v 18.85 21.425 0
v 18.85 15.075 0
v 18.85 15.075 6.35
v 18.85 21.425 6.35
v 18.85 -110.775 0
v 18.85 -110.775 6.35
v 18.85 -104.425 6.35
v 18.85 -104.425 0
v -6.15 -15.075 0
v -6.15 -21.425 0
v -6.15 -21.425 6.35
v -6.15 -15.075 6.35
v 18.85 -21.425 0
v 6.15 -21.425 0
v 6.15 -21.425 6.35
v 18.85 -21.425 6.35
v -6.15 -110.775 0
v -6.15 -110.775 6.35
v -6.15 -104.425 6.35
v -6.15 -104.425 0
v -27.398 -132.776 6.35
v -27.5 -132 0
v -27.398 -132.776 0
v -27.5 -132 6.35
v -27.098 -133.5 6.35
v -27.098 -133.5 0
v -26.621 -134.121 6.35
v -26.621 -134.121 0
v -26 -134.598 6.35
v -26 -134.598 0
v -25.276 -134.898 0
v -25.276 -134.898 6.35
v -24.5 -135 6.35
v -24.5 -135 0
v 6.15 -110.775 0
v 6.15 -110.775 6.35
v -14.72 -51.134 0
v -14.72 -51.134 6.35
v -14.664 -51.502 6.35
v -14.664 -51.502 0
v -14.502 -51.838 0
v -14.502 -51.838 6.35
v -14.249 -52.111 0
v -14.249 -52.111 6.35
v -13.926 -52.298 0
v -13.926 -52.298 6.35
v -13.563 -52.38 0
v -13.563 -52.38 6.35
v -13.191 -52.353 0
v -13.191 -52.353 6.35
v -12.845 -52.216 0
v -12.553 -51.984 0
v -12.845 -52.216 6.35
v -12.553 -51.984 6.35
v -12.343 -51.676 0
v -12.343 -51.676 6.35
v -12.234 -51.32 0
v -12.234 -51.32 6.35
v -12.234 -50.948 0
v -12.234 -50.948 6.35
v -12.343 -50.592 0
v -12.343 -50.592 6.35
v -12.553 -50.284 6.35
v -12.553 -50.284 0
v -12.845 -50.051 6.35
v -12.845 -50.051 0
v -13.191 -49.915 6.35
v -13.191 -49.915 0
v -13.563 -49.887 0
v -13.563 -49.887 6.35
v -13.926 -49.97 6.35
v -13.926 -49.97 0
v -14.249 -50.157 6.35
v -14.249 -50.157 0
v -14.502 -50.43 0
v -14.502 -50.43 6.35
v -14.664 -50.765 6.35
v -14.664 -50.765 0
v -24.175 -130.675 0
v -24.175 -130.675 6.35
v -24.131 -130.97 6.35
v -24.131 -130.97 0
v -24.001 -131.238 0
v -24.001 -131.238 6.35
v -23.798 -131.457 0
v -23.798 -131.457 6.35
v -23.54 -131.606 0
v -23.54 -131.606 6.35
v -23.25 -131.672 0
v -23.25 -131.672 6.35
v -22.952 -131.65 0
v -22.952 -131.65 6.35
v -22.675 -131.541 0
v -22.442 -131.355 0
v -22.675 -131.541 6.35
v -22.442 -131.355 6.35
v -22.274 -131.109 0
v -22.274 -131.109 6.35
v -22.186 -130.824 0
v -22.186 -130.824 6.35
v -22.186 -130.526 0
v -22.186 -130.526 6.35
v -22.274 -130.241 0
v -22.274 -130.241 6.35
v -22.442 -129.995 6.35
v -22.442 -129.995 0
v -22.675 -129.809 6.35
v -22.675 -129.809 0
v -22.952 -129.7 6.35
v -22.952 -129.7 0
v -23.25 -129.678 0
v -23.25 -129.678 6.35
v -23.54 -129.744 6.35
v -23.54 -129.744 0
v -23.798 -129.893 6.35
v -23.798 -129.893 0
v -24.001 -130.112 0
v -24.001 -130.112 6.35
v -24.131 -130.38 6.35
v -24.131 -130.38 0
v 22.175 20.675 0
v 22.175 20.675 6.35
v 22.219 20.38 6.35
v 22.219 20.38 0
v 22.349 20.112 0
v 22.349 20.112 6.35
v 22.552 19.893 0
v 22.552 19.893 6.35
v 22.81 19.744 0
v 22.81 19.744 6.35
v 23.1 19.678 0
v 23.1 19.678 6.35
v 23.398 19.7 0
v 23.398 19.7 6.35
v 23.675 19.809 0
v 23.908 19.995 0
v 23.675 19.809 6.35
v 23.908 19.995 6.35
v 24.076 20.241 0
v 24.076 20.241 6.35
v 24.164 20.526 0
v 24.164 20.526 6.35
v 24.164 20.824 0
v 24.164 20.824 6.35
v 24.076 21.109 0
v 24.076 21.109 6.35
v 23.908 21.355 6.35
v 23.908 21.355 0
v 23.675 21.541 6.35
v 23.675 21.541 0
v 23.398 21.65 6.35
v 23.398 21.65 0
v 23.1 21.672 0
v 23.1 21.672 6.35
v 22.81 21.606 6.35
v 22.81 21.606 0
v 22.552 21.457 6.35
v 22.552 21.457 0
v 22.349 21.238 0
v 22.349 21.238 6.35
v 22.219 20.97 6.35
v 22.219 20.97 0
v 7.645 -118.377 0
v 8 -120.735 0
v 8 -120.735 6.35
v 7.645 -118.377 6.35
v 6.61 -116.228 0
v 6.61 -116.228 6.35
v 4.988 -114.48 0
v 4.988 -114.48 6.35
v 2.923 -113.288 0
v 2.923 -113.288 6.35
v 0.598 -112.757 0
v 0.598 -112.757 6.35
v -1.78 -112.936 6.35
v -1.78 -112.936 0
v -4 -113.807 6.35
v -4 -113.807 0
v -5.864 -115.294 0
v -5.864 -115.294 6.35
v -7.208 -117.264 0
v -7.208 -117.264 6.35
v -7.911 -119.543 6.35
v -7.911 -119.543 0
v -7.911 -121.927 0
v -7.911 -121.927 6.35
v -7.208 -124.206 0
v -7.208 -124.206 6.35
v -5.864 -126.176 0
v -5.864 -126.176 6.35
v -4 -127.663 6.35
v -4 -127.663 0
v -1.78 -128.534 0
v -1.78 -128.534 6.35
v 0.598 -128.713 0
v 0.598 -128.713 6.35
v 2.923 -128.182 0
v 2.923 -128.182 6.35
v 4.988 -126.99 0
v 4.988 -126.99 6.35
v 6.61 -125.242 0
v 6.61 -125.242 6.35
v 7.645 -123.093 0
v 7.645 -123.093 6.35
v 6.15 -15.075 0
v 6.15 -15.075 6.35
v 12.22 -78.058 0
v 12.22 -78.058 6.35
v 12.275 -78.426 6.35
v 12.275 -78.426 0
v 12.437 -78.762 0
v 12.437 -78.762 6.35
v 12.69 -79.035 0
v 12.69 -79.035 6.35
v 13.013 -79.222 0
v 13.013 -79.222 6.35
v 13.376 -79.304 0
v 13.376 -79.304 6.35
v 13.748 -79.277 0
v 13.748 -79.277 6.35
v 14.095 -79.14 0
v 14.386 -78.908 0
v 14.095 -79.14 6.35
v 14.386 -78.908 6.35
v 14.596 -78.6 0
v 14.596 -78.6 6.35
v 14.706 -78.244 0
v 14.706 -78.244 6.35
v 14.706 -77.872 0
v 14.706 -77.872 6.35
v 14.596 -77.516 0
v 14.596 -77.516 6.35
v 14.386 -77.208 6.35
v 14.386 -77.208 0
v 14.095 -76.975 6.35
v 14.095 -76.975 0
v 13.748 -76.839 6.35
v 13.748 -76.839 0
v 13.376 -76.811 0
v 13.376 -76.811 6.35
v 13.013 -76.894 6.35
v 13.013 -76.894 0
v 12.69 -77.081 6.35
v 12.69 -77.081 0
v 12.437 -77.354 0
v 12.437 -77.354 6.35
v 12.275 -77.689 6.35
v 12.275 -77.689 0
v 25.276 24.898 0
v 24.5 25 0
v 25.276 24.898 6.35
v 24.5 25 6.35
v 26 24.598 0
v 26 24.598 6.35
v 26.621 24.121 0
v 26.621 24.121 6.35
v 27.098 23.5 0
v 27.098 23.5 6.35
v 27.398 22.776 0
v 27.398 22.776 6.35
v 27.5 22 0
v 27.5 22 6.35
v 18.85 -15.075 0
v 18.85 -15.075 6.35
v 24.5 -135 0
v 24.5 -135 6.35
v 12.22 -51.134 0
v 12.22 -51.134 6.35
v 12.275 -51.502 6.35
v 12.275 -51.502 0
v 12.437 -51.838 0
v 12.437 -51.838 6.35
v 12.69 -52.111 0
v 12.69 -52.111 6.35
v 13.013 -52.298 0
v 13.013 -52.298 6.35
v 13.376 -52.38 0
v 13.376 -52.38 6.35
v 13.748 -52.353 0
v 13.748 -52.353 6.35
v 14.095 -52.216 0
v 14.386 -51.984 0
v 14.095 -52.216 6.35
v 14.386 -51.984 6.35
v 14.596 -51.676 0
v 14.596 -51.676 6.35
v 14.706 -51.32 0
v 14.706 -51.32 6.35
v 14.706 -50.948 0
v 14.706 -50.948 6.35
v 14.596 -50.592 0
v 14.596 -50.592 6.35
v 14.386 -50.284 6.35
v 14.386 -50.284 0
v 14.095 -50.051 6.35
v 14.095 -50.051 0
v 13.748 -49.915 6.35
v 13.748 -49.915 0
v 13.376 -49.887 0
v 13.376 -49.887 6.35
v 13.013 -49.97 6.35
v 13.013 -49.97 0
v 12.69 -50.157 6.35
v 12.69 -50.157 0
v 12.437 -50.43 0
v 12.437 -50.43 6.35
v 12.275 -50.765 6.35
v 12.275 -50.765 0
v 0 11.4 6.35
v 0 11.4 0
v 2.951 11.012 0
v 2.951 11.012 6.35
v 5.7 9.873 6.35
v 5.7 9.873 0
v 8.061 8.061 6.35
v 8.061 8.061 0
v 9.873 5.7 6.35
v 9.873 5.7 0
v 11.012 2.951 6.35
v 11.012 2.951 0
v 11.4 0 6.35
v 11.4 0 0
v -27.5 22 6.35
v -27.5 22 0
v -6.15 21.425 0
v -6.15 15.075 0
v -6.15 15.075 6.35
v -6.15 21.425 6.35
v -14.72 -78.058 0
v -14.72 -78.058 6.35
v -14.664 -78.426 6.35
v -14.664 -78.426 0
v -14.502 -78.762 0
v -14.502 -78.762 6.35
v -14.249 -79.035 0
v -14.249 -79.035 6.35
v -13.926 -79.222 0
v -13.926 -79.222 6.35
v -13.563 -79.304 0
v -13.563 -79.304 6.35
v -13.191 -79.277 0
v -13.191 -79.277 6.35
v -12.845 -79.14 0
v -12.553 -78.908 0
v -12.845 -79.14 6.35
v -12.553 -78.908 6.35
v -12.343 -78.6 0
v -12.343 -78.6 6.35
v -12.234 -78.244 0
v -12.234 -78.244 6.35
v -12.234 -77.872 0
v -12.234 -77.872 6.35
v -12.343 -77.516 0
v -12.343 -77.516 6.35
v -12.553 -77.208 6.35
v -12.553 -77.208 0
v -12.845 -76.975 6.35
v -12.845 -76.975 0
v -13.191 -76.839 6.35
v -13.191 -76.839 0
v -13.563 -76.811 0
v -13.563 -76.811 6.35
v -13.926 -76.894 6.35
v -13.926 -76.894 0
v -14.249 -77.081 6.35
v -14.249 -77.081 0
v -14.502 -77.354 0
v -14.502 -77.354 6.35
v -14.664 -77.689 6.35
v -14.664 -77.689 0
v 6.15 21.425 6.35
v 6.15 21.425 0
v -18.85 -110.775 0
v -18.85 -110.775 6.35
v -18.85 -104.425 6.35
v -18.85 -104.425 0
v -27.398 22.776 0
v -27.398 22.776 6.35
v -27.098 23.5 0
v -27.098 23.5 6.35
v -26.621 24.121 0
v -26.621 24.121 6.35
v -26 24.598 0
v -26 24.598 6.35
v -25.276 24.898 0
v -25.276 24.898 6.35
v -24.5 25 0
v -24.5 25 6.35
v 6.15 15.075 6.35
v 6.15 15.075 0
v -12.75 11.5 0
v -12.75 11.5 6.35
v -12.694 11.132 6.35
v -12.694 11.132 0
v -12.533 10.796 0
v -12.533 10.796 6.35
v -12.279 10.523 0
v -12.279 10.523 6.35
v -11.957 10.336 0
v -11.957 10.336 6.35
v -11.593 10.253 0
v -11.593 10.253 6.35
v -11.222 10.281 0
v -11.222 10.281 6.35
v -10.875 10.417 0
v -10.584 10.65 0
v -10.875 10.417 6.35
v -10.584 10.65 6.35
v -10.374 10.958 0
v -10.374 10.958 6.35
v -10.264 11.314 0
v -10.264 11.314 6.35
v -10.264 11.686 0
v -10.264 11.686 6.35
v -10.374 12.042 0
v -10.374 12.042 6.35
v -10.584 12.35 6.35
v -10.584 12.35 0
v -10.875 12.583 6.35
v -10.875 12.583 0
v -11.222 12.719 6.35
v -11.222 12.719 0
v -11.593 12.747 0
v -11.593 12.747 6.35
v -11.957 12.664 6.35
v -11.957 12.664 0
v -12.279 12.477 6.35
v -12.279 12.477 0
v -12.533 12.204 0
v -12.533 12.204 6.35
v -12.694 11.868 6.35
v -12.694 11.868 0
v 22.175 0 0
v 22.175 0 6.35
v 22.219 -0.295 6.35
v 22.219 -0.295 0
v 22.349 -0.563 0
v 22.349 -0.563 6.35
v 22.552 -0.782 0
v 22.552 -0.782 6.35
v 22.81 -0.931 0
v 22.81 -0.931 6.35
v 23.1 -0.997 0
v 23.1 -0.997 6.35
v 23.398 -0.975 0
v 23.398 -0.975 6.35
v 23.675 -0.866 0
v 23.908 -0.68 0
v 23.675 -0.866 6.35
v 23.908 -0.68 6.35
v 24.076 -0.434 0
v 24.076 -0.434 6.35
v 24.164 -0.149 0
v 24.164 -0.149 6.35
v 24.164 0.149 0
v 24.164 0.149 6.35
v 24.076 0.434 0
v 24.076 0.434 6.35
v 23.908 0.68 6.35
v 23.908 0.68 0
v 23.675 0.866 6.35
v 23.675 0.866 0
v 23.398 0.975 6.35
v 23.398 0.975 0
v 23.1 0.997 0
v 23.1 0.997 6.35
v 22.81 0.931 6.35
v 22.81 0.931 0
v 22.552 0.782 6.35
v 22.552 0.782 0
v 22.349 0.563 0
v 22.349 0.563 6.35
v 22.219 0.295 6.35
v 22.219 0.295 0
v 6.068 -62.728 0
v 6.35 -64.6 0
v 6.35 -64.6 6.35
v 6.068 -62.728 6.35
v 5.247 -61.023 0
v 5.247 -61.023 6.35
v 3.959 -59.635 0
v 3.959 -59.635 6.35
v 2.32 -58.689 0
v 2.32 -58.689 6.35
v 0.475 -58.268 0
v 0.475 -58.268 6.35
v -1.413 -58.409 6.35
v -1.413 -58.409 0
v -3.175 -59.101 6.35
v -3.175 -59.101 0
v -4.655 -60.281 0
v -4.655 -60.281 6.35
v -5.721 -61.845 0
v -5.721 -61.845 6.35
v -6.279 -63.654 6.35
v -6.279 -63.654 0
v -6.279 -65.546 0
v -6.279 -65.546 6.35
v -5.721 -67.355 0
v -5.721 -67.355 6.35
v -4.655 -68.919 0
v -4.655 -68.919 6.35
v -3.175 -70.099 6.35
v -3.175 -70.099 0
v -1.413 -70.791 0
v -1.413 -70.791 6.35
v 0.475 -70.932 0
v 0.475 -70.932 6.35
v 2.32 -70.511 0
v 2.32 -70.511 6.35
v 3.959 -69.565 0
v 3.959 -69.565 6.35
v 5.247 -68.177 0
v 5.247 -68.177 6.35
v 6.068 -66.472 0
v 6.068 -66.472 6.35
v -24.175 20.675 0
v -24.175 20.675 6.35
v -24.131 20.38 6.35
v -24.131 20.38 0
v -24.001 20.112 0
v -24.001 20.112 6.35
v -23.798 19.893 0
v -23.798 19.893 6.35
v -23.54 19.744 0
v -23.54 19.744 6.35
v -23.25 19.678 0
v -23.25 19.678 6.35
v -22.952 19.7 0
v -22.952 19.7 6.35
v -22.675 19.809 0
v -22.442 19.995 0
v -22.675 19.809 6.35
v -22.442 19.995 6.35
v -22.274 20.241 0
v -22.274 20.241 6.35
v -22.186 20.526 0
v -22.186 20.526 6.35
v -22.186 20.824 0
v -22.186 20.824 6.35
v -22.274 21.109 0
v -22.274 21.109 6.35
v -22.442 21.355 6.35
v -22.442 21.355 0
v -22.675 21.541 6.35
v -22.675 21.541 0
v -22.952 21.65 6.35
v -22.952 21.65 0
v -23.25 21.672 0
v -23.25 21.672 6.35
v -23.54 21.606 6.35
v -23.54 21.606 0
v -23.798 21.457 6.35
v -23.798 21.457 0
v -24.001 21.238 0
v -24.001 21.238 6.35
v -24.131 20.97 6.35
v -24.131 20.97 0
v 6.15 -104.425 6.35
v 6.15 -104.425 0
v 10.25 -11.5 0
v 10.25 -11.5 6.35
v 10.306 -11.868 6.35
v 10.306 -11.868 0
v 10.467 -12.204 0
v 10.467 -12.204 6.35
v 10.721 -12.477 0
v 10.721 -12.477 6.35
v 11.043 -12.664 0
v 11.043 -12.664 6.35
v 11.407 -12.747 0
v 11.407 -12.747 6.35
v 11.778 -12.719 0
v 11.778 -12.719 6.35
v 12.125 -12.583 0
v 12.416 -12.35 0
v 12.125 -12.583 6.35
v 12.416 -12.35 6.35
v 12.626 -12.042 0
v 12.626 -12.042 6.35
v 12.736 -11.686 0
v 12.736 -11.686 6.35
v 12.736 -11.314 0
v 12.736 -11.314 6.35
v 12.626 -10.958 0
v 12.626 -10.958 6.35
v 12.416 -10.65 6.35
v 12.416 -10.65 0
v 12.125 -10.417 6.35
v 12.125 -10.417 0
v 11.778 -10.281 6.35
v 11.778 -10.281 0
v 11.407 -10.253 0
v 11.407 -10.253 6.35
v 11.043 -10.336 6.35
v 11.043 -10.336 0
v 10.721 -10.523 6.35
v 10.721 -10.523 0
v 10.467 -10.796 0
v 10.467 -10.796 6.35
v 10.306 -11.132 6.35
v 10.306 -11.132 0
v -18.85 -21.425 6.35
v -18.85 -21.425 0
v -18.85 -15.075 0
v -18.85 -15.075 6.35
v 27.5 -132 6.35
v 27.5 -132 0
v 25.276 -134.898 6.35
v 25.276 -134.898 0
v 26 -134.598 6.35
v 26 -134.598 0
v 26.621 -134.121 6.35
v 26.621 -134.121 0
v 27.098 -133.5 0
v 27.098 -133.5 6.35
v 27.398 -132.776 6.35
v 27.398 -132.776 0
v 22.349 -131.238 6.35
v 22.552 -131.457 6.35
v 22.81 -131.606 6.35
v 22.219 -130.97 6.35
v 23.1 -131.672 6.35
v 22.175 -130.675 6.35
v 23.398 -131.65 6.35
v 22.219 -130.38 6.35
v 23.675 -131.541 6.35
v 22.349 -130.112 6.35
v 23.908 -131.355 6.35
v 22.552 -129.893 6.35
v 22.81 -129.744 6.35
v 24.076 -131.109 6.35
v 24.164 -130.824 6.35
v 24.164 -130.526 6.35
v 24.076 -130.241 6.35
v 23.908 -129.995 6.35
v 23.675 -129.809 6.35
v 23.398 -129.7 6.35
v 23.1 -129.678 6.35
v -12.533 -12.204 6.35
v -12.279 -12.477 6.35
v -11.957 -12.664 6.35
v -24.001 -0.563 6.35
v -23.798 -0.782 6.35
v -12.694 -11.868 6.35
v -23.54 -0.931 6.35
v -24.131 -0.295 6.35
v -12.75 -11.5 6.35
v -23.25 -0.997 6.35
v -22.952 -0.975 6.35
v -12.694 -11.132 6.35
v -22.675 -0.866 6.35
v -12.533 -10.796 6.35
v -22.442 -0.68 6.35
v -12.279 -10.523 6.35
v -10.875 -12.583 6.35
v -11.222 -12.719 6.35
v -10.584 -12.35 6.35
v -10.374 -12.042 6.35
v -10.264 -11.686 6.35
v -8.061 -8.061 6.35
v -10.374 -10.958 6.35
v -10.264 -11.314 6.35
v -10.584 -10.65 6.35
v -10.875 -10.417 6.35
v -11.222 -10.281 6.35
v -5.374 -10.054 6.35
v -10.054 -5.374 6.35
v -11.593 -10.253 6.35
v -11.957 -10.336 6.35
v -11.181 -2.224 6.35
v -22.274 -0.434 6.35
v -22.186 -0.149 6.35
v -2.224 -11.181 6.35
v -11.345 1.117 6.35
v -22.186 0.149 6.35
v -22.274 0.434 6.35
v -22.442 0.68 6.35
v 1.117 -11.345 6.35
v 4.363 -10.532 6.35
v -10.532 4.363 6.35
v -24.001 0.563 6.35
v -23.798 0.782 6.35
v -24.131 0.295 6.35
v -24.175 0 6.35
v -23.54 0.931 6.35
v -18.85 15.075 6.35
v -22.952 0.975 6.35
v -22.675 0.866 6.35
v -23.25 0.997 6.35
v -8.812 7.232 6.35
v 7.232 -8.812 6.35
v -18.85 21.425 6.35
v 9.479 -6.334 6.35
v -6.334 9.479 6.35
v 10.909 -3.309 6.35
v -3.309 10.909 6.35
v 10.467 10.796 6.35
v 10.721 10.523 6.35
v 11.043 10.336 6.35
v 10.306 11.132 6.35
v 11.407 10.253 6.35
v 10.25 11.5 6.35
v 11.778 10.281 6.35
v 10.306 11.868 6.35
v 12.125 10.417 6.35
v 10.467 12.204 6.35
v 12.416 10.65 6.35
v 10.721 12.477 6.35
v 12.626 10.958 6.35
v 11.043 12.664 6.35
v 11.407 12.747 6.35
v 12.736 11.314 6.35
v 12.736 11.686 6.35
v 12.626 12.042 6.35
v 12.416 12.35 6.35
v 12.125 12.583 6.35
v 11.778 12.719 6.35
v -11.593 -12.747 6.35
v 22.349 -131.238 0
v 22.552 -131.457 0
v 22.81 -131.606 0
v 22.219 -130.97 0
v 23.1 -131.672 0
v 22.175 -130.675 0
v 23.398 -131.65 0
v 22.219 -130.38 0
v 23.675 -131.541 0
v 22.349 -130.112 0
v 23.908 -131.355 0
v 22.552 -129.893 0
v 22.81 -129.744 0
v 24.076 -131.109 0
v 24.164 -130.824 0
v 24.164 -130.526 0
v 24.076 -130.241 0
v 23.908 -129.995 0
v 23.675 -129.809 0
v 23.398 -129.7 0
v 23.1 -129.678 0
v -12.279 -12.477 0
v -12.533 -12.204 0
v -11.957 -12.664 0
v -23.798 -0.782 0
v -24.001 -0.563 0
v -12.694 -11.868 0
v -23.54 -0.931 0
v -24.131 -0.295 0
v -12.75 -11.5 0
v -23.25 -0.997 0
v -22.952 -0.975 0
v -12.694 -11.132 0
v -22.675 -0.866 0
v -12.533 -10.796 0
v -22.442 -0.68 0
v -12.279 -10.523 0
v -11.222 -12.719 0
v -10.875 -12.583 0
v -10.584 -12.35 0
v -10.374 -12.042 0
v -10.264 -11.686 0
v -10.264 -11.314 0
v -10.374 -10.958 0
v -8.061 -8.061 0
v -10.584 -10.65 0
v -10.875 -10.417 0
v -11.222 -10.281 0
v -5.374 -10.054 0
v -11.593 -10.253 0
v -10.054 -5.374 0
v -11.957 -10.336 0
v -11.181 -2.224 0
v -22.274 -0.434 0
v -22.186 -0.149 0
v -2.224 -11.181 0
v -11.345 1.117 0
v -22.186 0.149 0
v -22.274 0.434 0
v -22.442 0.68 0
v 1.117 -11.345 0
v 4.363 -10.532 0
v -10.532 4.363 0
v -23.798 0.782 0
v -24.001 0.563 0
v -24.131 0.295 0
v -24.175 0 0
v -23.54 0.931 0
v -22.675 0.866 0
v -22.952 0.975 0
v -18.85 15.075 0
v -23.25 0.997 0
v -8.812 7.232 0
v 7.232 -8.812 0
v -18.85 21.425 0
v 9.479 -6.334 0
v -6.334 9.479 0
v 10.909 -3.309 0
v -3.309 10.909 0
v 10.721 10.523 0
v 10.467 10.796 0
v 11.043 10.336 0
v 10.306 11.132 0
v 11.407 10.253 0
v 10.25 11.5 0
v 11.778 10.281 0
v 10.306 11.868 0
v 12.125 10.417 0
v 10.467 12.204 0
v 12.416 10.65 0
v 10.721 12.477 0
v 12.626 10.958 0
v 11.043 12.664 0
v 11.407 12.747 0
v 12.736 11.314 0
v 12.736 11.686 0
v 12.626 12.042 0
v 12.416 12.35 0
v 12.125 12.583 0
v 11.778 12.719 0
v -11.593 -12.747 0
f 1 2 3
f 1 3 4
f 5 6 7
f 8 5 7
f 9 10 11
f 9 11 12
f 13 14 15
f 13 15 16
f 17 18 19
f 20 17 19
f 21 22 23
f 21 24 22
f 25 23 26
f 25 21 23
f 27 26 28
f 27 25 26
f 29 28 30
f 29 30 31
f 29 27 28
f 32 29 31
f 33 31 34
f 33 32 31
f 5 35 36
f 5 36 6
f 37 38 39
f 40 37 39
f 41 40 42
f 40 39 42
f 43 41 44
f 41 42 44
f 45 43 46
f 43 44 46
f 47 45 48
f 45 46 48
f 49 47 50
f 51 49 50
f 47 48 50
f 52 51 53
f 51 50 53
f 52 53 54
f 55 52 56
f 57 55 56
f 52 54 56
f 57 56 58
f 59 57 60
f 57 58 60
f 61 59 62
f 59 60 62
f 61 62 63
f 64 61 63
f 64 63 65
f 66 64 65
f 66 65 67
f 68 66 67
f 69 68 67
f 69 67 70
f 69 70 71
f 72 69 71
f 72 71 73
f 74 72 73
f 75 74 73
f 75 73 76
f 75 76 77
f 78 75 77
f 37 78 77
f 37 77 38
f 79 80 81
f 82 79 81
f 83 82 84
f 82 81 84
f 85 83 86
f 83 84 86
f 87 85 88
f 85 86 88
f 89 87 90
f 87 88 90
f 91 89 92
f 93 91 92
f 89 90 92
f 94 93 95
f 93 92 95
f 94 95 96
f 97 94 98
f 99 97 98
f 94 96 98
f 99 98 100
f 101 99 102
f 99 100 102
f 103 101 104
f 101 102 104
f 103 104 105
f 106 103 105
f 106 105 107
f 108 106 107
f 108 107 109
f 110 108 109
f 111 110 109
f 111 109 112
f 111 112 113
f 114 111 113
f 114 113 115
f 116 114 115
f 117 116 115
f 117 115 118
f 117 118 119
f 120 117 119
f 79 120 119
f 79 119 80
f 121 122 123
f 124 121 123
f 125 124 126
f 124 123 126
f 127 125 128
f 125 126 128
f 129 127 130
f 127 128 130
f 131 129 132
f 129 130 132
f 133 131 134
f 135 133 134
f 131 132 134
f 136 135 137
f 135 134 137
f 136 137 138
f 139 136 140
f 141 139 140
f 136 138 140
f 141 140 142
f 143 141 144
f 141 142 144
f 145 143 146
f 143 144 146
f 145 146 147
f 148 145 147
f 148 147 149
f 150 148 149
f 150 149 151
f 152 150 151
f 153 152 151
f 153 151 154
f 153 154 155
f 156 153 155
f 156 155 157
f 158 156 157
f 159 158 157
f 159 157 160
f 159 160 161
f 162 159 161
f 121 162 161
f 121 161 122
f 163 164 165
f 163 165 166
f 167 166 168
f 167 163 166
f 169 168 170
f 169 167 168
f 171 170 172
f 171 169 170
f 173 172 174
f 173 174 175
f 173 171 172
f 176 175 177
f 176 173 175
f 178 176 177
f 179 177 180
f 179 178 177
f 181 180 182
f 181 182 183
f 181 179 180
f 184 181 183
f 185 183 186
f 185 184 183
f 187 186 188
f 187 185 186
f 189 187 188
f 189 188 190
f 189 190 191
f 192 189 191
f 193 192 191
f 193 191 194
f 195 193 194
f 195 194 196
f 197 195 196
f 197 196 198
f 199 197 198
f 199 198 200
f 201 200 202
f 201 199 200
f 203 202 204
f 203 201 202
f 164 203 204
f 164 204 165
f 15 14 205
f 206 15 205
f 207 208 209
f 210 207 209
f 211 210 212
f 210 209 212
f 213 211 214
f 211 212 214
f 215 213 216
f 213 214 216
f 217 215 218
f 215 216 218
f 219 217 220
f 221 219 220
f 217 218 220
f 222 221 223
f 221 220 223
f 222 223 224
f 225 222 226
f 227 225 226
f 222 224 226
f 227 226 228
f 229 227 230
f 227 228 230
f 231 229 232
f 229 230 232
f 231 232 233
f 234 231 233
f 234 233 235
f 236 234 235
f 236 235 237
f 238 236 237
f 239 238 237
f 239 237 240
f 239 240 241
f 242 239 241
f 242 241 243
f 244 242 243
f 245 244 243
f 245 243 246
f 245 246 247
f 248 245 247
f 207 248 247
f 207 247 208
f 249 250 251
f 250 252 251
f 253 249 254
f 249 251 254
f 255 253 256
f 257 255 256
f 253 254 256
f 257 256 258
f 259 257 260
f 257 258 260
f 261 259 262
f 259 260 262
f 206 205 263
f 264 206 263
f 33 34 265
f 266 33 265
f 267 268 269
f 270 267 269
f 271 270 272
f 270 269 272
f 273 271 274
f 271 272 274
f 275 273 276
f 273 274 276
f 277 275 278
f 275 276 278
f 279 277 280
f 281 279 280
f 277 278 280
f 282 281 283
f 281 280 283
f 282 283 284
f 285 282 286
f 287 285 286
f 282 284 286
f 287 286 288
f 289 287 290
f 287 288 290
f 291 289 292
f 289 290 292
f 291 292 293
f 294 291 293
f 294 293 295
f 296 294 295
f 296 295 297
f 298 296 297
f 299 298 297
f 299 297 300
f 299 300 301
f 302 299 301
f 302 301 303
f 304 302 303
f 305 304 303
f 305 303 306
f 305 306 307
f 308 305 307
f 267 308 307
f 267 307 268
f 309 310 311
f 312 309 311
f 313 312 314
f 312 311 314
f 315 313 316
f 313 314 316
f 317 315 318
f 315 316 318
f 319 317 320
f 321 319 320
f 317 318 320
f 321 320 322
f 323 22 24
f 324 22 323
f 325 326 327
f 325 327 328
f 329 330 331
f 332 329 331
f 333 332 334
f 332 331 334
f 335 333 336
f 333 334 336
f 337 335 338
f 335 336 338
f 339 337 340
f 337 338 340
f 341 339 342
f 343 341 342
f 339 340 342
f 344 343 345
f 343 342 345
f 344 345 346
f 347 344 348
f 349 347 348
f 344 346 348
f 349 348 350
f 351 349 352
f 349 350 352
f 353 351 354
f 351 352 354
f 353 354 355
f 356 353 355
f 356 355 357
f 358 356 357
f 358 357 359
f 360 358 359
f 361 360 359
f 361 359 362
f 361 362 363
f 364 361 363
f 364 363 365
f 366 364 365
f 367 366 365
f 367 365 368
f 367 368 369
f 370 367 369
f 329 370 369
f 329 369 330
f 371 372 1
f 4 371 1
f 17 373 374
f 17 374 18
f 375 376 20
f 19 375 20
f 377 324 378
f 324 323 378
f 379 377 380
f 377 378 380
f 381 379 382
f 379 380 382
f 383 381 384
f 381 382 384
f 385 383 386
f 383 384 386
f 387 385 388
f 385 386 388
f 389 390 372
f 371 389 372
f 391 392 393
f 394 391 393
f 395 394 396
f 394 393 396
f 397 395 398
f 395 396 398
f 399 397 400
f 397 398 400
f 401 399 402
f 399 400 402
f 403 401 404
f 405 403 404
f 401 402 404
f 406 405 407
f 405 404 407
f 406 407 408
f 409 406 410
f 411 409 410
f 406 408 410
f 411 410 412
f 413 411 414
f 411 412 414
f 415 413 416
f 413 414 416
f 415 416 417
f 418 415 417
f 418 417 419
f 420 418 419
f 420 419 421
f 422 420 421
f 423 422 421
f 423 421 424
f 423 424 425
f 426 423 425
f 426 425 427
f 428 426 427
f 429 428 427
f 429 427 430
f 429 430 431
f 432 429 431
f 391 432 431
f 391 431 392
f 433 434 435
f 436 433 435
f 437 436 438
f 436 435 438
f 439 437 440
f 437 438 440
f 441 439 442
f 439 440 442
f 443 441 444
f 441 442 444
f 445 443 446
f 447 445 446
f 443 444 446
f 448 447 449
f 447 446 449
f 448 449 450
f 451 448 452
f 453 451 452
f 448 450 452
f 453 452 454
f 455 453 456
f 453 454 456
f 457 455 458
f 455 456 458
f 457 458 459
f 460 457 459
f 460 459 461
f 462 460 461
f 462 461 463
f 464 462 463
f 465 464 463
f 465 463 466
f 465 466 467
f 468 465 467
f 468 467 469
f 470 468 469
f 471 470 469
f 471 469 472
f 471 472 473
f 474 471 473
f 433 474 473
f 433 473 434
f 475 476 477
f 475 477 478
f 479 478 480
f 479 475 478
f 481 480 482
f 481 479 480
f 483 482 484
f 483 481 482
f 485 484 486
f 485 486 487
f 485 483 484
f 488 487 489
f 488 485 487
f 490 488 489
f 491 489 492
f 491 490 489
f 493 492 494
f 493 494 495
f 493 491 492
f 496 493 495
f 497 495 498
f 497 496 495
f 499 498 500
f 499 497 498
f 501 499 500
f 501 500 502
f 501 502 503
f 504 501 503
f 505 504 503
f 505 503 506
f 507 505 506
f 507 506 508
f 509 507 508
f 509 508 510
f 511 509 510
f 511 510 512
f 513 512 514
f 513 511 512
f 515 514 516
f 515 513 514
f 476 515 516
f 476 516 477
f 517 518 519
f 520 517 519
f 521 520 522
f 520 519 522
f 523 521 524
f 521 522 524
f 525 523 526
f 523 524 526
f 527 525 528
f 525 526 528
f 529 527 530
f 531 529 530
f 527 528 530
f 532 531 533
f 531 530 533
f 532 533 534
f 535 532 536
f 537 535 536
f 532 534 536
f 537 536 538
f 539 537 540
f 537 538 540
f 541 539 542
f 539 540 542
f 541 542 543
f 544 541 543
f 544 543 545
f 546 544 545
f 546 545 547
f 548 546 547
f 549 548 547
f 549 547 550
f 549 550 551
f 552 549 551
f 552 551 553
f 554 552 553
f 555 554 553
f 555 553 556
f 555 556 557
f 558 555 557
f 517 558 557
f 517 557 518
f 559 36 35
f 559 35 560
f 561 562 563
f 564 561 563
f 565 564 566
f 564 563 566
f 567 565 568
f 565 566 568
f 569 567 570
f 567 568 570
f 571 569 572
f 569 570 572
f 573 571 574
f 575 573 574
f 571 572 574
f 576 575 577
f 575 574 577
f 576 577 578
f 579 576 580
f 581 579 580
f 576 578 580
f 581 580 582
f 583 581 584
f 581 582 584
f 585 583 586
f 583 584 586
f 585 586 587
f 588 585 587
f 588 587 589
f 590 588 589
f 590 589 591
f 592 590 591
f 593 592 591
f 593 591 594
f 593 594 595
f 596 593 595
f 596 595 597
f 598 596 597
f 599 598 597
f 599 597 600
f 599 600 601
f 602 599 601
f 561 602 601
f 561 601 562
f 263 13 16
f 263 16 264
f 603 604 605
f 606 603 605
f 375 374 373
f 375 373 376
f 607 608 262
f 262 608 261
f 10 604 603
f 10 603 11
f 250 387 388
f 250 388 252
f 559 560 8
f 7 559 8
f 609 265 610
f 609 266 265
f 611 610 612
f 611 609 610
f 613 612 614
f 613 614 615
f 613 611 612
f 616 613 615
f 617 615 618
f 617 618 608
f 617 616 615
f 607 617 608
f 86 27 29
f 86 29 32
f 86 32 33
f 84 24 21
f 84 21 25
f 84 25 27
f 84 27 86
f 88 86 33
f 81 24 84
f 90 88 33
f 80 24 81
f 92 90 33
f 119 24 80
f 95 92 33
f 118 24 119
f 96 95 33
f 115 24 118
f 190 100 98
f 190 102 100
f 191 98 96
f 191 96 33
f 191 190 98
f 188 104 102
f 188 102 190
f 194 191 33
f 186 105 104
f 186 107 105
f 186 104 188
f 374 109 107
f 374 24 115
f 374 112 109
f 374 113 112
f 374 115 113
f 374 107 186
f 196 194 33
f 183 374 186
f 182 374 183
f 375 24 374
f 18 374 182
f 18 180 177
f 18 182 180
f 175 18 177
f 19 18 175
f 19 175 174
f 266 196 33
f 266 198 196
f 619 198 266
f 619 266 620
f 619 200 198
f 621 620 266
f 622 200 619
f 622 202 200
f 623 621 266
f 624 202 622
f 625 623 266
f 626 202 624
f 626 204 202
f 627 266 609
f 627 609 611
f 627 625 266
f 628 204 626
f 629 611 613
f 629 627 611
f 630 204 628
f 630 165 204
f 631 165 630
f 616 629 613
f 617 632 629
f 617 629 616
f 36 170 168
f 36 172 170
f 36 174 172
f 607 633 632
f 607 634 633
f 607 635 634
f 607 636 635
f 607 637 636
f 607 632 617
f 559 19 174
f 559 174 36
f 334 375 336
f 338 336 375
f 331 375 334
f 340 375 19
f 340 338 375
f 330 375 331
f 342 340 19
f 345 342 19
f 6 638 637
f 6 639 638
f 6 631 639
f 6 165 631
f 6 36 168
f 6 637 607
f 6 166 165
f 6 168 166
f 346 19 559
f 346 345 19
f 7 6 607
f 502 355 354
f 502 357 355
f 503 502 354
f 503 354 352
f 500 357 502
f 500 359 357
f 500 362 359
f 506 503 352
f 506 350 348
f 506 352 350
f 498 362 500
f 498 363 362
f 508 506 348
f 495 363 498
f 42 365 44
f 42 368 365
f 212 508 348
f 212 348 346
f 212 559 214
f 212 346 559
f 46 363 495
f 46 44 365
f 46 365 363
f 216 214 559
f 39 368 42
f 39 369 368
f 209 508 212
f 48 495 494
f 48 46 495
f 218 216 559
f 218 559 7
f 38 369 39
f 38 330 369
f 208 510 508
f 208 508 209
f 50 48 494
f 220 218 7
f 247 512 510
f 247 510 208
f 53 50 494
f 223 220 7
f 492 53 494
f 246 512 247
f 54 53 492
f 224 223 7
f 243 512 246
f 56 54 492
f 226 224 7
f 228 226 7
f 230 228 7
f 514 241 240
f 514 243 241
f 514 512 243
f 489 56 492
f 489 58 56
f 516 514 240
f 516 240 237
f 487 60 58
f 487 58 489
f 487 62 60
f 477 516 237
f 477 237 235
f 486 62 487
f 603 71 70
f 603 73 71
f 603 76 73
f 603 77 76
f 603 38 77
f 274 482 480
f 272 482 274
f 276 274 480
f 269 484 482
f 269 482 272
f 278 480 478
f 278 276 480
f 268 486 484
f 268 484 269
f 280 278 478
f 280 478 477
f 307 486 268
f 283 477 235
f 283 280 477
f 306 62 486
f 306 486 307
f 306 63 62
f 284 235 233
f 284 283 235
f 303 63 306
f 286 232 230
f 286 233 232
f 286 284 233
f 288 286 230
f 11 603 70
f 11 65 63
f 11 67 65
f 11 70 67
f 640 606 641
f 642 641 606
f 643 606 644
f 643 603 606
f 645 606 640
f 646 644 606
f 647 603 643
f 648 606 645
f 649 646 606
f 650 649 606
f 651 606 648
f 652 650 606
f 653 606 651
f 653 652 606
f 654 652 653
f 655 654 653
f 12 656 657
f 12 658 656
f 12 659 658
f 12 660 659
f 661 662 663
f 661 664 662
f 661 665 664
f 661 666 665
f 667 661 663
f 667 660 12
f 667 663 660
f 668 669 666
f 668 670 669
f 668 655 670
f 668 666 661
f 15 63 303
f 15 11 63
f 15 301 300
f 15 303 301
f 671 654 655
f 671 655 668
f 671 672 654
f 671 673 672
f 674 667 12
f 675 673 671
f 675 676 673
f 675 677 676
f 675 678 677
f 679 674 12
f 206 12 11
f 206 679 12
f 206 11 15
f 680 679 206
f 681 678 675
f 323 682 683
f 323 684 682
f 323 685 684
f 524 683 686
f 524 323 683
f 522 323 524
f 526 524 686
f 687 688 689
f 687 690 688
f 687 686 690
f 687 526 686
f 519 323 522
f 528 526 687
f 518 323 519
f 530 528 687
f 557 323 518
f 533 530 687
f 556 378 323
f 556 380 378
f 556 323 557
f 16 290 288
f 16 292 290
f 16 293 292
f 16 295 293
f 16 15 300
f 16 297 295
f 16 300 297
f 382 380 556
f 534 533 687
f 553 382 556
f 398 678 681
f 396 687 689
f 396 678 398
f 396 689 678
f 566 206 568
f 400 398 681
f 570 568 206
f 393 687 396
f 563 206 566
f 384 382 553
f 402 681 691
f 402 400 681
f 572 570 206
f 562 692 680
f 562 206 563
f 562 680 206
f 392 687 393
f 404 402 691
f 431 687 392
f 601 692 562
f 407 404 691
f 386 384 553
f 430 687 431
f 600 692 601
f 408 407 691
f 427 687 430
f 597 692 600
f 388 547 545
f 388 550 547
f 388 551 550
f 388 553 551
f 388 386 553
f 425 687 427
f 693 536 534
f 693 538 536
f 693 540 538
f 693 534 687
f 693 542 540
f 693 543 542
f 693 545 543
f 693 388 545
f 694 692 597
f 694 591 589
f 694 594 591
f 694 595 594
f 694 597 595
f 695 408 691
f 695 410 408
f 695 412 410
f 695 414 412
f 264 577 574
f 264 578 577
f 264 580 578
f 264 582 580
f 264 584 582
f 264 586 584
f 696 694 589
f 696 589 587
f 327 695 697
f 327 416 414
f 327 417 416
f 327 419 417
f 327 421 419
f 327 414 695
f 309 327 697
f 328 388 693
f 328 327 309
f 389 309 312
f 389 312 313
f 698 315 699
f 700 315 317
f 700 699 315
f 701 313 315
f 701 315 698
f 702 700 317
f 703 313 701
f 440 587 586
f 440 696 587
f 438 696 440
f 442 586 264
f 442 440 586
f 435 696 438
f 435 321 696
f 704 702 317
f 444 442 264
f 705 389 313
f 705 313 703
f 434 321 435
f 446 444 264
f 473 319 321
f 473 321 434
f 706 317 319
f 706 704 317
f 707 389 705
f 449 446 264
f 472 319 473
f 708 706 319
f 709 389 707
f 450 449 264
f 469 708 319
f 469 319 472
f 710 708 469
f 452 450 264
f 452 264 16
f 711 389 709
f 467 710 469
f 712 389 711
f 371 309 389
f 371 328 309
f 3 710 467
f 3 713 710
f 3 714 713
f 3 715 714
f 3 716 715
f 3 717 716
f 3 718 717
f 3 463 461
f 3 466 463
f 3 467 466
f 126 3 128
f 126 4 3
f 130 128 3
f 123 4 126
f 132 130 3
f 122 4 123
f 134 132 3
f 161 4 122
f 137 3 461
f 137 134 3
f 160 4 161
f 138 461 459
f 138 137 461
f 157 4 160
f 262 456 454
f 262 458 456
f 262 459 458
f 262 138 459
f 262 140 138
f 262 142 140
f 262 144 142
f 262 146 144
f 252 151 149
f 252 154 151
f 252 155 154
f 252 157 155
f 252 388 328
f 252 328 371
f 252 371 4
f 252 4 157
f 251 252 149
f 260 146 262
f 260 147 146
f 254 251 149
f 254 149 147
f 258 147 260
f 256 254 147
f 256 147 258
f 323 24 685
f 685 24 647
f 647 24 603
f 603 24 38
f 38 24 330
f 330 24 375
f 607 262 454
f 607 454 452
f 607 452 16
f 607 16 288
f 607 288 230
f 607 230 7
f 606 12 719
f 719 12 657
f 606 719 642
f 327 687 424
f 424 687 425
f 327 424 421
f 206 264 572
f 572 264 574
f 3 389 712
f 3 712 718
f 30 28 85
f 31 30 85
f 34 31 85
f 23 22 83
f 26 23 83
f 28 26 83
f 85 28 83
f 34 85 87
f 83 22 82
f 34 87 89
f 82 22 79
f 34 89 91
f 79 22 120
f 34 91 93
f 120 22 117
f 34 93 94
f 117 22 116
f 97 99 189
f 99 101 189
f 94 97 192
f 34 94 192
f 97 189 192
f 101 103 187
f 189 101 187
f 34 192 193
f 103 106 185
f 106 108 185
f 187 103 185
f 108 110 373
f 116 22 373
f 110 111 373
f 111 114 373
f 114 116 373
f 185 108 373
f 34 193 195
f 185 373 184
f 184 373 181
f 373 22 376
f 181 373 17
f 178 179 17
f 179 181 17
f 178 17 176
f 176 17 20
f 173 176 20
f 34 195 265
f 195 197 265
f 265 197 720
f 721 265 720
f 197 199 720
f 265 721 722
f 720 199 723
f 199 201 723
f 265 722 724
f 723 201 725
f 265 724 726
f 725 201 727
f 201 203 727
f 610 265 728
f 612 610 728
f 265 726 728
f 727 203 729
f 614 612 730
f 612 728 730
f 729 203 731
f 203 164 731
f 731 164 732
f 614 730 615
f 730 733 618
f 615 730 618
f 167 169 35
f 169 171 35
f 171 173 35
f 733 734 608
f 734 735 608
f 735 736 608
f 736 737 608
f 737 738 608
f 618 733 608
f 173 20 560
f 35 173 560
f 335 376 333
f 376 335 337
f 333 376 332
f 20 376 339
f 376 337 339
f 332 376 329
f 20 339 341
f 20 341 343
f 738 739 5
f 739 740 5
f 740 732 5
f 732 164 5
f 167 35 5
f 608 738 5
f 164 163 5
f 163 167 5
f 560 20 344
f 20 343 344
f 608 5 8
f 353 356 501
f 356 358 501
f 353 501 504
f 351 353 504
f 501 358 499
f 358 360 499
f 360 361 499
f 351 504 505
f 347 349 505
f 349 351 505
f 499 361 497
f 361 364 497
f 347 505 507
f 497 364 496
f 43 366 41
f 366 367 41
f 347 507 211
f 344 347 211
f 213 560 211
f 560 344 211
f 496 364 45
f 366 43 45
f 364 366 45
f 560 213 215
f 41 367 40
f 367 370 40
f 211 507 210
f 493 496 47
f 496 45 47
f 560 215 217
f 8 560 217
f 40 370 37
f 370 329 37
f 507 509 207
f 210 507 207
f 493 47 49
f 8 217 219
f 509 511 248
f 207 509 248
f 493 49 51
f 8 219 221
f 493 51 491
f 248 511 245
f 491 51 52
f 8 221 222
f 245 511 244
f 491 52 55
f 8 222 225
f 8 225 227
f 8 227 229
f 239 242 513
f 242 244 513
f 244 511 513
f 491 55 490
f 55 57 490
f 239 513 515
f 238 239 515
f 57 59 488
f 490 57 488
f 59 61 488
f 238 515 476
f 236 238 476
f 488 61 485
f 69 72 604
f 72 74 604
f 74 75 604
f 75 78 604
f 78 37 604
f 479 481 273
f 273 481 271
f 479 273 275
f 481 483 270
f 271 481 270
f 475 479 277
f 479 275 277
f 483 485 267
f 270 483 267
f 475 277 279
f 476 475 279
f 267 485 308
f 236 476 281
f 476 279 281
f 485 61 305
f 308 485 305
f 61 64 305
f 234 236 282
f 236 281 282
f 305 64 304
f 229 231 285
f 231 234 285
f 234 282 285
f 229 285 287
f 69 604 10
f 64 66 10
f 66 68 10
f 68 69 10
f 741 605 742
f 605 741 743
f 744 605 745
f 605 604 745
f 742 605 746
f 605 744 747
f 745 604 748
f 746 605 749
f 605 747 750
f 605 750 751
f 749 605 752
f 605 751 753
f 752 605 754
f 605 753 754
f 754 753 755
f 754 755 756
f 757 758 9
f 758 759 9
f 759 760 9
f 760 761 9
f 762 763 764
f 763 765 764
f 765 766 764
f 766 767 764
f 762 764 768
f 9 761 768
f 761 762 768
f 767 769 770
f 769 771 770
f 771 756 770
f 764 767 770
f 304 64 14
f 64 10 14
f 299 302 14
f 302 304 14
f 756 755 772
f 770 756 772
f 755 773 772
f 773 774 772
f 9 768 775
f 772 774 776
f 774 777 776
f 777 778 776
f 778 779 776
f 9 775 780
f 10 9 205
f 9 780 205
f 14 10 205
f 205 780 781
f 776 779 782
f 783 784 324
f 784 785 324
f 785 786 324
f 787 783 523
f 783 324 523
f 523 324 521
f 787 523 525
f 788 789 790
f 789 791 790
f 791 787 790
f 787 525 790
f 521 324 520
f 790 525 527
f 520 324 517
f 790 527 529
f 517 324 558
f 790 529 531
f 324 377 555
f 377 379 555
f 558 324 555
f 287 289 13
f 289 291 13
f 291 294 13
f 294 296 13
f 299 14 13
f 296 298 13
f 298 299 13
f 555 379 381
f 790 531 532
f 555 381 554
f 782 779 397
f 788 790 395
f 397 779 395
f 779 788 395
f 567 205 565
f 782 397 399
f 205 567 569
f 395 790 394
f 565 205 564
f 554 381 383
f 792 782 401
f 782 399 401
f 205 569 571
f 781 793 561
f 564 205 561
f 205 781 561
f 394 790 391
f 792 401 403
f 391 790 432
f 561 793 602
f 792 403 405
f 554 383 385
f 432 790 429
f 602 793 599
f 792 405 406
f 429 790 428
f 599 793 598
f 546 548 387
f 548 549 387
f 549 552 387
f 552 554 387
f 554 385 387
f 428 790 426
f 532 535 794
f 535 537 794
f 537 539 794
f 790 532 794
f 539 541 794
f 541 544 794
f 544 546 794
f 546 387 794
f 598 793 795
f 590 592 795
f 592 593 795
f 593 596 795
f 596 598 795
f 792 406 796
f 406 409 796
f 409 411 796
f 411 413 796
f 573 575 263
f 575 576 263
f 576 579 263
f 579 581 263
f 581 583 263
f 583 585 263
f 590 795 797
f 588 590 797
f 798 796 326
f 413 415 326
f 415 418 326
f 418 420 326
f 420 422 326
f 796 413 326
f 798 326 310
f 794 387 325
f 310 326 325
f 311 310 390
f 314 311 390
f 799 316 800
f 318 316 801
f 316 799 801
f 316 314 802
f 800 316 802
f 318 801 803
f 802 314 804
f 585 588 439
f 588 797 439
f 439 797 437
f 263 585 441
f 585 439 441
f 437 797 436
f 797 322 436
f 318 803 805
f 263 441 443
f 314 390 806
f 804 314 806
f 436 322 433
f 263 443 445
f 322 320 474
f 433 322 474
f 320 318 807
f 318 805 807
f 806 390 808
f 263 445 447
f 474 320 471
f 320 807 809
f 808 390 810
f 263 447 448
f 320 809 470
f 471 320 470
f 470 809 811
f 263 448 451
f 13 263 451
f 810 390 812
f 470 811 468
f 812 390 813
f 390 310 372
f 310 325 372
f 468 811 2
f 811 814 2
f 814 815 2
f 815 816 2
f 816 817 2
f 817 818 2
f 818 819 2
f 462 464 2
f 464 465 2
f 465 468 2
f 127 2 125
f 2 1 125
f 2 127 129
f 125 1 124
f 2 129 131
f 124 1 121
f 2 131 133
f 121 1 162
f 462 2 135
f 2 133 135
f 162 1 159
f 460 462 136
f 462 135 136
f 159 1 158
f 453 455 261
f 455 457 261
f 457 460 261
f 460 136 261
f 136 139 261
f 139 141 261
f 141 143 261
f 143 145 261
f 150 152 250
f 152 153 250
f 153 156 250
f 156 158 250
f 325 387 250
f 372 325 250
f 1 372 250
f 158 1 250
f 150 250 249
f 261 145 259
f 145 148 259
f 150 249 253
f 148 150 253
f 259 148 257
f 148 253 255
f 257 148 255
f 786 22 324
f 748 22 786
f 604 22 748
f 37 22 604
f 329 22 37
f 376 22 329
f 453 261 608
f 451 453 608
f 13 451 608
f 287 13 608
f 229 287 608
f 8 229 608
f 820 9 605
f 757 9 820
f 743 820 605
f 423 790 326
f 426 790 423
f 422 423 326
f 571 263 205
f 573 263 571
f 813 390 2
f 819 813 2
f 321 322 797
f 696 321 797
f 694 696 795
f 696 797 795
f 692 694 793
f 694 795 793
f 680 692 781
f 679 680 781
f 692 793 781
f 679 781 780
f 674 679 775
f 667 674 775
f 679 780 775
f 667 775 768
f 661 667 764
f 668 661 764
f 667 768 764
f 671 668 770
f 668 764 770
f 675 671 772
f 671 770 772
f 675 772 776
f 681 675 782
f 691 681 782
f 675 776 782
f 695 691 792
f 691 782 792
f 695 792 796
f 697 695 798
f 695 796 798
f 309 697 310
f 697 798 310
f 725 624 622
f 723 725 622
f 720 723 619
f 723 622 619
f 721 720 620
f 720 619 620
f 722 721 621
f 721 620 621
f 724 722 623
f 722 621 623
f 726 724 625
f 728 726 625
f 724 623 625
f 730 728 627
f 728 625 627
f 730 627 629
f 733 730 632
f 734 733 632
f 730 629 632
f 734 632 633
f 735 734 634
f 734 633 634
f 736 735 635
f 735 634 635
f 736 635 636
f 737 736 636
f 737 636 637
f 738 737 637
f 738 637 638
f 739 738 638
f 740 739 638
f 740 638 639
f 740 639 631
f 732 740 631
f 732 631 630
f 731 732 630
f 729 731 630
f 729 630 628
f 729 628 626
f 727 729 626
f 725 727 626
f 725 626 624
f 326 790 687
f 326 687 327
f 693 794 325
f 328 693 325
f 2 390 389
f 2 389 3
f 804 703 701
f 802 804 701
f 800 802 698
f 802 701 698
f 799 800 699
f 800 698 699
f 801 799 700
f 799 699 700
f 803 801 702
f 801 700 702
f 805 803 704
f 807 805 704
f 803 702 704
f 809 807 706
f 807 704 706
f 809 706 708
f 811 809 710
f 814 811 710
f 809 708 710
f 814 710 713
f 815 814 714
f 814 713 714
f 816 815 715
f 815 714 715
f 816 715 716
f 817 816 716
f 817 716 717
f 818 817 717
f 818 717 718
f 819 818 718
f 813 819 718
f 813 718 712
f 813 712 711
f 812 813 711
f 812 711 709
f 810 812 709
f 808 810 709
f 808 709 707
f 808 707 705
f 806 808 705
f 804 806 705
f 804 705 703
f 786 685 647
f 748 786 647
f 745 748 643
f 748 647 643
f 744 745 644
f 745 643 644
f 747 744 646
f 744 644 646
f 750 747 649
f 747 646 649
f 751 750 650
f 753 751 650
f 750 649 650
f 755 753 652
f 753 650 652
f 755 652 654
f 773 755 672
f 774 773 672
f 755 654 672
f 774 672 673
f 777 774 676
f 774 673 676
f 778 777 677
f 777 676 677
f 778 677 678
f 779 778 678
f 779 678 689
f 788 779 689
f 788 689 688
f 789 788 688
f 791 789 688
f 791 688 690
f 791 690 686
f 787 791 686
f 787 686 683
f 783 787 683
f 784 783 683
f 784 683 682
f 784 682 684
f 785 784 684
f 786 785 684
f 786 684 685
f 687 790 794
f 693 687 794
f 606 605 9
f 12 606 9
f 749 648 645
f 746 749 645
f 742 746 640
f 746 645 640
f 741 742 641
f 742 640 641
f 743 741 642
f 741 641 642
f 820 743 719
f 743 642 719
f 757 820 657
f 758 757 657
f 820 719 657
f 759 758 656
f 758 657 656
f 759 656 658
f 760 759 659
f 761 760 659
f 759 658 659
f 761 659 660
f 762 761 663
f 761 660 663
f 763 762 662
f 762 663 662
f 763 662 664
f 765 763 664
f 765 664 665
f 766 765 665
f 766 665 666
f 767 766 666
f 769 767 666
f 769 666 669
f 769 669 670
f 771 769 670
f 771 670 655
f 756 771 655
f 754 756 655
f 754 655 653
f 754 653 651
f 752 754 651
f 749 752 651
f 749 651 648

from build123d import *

# Parameters (mm, degrees)
F0_W     = 55
F0_H     = 160
F0_W_2   = 12.7
F0_H_2   = 6.35
F0_R     = 8
F0_R_2   = 6.35
F1_DEPTH = 6.35
F2_D     = 2.5
F3_R     = 3
F4_D     = 2


with BuildPart() as f1:
    # F0 (on Top) → F1 (new body)
    with BuildSketch(Plane.XY):
        with Locations((0, -55)):
            Rectangle(F0_W, F0_H)
        with Locations((-12.5, -107.6)):
            Rectangle(F0_W_2, F0_H_2, mode=Mode.SUBTRACT)
        with Locations((0, -120.735)):
            Circle(F0_R, mode=Mode.SUBTRACT)
        with Locations((12.5, -107.6)):
            Rectangle(F0_W_2, F0_H_2, mode=Mode.SUBTRACT)
        with Locations((0, -64.6)):
            Circle(F0_R_2, mode=Mode.SUBTRACT)
        with Locations((-12.5, -18.25)):
            Rectangle(F0_W_2, F0_H_2, mode=Mode.SUBTRACT)
        with Locations((-12.5, 18.25)):
            Rectangle(F0_W_2, F0_H_2, mode=Mode.SUBTRACT)
        with Locations((12.5, -18.25)):
            Rectangle(F0_W_2, F0_H_2, mode=Mode.SUBTRACT)
        with BuildLine():
            ThreePointArc((0, 11.4), (8.0610173055, 8.0610173055), (11.4, 0))
            ThreePointArc((11.4, 0), (-8.0610173055, -8.0610173055), (0, 11.4))
        make_face(mode=Mode.SUBTRACT)
        with Locations((12.5, 18.25)):
            Rectangle(F0_W_2, F0_H_2, mode=Mode.SUBTRACT)
    extrude(amount=F1_DEPTH)

    # F2 (through all)
    with Locations(Plane(origin=(0, 0, 0), x_dir=(1, 0, 0), z_dir=(0, 0, -1))):
        with Locations((-11.5, -11.5), (11.5, -11.5), (11.5, 11.5), (-11.5, 11.5), (-13.46962, 51.133907857), (13.46962, 51.133907857), (13.46962, 78.057907857), (-13.46962, 78.057907857)):
            Hole(F2_D / 2)

    # F3
    f3_edges = [f1.edges().sort_by_distance(p)[0] for p in [
        (-27.5, -135, 3.175),
        (27.5, -135, 3.175),
        (27.5, 25, 3.175),
        (-27.5, 25, 3.175),
    ]]
    fillet(f3_edges, radius=F3_R)

    # F4 (through all)
    with Locations(Plane(origin=(0, 0, 0), x_dir=(1, 0, 0), z_dir=(0, 0, -1))):
        with Locations((-23.175, 130.675), (23.175, 130.675), (23.175, 0), (23.175, -20.675), (-23.175, -20.675), (-23.175, 0)):
            Hole(F4_D / 2)


solid = f1.part
